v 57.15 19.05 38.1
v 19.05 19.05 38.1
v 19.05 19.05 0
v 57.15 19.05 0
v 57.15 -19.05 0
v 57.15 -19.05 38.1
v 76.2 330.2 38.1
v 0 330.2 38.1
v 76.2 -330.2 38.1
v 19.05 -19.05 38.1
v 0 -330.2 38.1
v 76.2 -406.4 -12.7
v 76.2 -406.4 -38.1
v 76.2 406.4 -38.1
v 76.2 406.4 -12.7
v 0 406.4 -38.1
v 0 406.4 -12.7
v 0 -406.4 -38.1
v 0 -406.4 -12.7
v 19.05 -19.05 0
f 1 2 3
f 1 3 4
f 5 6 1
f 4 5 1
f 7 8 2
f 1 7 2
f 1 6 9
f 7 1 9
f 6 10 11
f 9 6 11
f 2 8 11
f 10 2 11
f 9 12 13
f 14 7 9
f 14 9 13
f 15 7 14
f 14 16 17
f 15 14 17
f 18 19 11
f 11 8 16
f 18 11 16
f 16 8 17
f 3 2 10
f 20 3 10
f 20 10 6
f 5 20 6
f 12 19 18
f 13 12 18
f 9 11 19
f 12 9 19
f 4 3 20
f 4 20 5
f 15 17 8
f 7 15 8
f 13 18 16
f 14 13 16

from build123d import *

# Parameters (mm, degrees)
F1_DEPTH = 76.2
F2_W     = 38.1
F2_H     = 19.05
F3_DEPTH = 38.1


with BuildPart() as f1:
    # F0 (on Right) → F1 (new body)
    with BuildSketch(Plane.YZ):
        Polygon((406.4, -12.7), (330.2, 38.1), (-330.2, 38.1), (-406.4, -12.7), (-406.4, -38.1), (-292.1, -38.1), (292.1, -38.1), (406.4, -38.1), align=None)
    extrude(amount=F1_DEPTH)

    # F2 (on face) → F3 (cut)
    with BuildSketch(Plane.XY.offset(38.1)):
        with Locations((38.1, 9.525)):
            Rectangle(F2_W, F2_H)
        with Locations((38.1, -9.525)):
            Rectangle(F2_W, F2_H)
    extrude(amount=-F3_DEPTH, mode=Mode.SUBTRACT)


solid = f1.part
